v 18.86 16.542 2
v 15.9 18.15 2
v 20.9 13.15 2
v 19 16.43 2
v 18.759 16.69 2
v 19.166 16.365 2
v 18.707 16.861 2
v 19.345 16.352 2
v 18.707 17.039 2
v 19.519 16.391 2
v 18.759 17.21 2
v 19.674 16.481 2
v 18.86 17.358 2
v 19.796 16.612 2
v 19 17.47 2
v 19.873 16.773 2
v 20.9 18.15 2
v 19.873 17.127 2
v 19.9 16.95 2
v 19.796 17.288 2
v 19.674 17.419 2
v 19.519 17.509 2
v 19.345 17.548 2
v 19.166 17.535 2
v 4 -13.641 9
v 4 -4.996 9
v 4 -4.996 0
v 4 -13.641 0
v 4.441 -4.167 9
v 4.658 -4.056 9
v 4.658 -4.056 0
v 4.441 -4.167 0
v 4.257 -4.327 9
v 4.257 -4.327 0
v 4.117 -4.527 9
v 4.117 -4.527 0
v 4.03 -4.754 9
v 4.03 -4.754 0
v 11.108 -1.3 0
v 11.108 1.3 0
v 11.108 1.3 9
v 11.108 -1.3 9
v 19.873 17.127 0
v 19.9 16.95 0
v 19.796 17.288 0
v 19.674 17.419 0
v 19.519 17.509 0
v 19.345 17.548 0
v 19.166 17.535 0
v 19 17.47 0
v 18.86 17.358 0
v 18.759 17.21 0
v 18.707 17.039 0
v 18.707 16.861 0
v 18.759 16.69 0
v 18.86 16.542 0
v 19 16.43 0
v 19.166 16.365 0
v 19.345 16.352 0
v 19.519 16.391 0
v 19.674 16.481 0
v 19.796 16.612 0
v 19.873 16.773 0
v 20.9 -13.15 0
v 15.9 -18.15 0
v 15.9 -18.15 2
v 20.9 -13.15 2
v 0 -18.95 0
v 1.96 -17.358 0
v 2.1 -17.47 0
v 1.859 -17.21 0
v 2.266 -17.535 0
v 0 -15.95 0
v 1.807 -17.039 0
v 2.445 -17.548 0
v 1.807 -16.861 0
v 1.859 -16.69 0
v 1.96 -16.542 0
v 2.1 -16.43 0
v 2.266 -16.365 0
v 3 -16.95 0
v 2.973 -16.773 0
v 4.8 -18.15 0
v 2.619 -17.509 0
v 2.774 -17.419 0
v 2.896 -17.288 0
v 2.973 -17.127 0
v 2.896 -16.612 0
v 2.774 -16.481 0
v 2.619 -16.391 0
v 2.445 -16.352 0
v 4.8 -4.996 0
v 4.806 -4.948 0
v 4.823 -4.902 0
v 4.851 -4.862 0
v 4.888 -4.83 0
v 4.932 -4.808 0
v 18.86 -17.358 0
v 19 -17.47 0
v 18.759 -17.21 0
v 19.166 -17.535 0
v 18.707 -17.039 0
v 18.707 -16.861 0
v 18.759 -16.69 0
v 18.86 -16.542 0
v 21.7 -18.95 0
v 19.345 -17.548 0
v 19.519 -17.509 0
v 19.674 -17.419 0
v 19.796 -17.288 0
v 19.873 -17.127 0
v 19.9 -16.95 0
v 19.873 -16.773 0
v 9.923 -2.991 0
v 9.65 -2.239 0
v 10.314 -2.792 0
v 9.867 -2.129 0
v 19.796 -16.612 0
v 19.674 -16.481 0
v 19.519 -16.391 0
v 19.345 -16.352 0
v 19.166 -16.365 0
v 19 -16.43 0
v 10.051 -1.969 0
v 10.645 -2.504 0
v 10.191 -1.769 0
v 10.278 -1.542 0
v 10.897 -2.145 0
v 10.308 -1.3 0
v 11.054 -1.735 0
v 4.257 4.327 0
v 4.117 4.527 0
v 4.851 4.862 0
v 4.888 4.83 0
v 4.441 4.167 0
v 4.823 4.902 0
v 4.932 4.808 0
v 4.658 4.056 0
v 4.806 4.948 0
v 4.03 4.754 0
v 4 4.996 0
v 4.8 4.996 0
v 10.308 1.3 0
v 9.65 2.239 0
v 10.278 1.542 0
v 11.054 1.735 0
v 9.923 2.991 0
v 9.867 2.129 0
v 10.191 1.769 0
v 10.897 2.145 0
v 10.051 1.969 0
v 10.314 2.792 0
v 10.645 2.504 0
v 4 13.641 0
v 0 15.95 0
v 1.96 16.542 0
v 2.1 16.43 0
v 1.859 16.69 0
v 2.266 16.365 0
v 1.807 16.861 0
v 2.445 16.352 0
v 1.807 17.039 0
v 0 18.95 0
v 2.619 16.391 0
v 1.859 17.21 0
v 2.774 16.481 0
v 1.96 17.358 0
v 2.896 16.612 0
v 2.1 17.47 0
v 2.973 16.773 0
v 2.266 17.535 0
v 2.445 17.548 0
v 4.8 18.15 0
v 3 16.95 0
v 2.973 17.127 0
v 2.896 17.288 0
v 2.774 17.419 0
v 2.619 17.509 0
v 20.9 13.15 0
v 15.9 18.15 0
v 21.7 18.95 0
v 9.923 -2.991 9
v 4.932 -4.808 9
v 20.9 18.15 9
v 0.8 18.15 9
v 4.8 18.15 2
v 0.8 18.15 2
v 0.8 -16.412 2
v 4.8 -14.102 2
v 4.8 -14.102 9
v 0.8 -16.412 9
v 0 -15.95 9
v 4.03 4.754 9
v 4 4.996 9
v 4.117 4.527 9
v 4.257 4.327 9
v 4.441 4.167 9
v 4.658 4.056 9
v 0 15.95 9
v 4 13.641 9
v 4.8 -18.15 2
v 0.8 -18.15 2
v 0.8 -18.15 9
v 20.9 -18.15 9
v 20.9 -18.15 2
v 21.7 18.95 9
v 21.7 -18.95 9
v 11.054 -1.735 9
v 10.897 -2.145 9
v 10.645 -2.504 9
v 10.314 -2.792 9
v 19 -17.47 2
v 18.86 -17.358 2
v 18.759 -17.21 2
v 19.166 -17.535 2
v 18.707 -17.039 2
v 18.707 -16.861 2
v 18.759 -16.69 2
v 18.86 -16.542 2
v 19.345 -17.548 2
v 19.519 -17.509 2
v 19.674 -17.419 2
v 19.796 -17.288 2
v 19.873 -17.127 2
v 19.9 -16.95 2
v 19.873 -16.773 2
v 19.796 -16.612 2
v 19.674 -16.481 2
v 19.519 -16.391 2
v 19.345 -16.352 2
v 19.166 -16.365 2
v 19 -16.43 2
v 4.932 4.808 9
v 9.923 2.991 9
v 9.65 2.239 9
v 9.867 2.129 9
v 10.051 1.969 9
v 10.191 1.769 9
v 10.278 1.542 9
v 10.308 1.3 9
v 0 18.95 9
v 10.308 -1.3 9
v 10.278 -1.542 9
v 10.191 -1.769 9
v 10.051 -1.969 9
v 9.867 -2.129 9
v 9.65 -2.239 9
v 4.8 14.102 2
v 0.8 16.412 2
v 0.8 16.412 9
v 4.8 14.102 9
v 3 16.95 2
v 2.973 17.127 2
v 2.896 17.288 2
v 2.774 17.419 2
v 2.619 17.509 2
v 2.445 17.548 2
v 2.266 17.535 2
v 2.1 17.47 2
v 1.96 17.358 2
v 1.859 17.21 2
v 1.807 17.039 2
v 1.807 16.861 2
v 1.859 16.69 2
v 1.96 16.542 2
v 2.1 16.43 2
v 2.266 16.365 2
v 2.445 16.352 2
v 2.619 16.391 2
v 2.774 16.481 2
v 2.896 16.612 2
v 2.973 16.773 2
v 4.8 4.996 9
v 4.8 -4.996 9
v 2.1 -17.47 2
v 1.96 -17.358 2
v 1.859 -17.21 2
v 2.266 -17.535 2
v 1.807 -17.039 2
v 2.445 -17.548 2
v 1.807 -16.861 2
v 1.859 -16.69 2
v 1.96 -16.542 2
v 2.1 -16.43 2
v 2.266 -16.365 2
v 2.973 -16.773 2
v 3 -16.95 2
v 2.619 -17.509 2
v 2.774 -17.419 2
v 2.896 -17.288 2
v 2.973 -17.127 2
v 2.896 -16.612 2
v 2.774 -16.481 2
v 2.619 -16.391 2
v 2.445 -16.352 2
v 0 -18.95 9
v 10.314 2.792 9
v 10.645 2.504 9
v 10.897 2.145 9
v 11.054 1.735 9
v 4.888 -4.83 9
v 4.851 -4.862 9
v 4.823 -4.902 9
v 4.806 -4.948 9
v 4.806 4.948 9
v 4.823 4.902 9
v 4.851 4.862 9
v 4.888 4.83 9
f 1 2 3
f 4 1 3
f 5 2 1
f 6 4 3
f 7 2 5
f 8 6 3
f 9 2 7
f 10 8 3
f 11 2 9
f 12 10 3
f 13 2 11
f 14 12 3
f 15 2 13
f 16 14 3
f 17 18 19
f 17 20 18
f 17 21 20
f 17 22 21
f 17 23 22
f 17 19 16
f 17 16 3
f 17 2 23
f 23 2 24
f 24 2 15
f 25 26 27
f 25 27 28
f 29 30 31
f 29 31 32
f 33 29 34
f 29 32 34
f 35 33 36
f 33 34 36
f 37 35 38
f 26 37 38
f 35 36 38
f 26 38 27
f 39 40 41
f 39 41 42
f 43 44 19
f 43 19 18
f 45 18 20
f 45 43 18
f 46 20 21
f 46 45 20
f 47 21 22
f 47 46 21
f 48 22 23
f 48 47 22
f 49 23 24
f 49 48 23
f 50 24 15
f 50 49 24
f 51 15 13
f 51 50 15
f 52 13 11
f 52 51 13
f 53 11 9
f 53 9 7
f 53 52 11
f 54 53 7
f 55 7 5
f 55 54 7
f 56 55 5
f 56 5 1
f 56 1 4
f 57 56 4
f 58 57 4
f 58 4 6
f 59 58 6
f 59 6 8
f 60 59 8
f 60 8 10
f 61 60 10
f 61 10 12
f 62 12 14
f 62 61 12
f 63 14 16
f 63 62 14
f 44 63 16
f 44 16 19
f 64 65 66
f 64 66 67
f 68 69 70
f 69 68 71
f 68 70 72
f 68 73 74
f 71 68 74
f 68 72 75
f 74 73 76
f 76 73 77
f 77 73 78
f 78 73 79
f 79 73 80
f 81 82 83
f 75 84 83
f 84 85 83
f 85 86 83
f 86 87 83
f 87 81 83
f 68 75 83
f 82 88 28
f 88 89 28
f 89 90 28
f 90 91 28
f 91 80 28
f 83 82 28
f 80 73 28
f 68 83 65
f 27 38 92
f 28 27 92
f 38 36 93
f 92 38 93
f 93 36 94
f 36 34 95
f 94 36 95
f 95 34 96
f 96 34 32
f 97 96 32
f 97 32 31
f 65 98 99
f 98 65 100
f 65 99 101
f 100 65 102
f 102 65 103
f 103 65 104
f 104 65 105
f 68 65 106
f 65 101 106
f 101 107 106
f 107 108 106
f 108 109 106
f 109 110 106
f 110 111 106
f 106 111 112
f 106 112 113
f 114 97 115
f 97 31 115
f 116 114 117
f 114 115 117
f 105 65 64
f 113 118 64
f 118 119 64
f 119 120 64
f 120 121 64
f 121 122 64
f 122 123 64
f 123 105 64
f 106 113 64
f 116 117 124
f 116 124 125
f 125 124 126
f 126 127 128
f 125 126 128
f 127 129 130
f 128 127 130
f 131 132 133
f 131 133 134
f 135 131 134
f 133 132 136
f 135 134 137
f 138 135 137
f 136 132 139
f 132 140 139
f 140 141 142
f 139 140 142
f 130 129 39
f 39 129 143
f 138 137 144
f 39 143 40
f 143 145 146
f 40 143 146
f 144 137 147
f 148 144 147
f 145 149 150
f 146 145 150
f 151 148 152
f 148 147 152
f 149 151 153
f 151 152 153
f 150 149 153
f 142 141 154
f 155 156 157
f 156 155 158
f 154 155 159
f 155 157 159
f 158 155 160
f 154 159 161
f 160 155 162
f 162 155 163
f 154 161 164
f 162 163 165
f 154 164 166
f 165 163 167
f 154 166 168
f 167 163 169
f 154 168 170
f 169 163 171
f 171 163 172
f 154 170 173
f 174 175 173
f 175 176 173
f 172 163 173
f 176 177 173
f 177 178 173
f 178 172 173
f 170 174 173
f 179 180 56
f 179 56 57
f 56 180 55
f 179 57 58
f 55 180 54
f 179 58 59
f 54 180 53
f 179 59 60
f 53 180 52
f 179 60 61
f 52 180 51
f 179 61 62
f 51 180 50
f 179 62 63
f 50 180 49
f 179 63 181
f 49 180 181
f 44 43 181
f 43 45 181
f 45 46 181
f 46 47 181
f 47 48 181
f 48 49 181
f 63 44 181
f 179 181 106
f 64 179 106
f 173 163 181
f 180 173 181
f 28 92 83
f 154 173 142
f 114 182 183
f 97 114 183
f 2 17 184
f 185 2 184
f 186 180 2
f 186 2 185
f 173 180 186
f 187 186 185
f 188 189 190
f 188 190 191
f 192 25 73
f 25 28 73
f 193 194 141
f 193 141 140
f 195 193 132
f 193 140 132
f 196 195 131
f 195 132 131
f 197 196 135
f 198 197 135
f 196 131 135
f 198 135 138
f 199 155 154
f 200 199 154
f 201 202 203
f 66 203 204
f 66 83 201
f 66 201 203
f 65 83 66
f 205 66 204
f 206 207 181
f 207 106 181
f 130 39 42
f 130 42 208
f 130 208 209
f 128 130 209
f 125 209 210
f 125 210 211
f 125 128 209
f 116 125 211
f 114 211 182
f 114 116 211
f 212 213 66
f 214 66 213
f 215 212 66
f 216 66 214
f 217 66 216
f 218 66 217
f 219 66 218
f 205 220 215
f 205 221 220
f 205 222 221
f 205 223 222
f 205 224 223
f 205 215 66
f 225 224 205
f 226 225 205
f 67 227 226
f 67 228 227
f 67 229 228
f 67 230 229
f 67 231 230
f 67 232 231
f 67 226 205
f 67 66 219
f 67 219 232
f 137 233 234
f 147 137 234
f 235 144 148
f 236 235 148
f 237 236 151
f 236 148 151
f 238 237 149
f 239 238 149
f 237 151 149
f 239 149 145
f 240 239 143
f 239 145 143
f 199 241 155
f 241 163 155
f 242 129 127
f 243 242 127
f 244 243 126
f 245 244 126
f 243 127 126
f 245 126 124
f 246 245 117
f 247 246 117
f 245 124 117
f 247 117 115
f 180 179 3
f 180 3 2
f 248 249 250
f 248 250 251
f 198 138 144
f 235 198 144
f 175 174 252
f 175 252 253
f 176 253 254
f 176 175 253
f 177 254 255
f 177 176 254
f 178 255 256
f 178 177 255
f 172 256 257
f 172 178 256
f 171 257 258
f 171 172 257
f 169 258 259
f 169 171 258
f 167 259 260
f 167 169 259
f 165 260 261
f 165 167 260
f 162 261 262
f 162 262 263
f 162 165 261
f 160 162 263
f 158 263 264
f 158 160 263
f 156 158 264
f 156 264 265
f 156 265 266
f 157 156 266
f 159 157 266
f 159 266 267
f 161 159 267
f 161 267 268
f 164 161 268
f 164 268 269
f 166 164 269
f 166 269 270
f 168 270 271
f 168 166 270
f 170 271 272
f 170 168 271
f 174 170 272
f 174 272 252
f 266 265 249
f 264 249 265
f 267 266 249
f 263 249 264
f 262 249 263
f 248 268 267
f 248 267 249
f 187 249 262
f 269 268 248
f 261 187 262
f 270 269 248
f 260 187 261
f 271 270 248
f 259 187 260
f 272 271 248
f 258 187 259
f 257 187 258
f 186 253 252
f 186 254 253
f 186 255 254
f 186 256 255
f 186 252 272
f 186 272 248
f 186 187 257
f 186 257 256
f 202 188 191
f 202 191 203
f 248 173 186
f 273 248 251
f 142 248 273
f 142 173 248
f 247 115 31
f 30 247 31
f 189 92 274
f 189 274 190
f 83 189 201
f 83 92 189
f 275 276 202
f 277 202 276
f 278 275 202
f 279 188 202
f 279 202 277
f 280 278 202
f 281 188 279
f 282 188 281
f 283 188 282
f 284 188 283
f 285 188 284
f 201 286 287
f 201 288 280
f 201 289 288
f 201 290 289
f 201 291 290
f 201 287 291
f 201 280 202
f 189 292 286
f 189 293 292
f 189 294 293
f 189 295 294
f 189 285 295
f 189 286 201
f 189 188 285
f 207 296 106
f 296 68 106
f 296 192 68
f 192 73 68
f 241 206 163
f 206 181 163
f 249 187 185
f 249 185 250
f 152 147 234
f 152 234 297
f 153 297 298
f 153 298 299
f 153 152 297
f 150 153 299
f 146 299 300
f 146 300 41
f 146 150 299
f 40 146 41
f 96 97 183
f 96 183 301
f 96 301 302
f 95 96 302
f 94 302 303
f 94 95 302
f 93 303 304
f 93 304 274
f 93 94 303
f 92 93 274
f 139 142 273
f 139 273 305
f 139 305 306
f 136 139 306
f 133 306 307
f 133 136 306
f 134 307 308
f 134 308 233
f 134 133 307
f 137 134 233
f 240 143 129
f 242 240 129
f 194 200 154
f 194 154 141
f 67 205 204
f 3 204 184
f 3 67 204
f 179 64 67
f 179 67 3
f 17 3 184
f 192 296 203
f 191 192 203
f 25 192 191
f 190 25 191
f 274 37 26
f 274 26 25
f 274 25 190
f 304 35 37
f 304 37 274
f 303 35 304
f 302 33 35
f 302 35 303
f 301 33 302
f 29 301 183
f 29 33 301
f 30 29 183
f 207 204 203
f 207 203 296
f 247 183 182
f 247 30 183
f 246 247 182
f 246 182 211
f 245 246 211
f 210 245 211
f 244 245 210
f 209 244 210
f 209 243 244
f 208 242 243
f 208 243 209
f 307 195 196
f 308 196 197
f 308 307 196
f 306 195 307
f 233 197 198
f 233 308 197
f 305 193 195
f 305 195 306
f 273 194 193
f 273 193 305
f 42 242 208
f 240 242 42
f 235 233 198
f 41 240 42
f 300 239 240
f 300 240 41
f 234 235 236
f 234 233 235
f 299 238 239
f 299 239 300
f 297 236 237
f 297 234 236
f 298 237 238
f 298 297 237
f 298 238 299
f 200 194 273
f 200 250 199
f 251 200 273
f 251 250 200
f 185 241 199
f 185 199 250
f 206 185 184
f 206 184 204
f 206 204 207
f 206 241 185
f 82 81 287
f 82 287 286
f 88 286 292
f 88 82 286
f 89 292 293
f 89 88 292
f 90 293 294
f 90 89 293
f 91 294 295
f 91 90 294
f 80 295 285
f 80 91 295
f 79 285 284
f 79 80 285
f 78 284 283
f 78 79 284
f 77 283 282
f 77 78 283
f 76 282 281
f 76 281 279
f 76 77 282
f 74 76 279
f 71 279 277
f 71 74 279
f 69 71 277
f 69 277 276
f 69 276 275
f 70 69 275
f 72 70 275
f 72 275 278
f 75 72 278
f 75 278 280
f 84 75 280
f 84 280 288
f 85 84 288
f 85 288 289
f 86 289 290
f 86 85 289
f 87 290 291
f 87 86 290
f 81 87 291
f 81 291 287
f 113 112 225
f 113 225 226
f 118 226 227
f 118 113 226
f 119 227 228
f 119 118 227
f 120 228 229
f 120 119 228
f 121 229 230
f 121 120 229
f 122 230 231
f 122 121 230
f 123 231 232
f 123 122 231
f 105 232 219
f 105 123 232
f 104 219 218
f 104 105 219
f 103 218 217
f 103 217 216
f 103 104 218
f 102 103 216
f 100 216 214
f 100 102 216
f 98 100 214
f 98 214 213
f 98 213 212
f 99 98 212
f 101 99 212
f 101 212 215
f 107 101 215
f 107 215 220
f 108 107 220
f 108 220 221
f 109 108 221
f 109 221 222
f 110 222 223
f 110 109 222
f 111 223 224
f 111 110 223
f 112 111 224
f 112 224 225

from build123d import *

# Parameters (mm, degrees)
SKETCH_1_R      = 0.6
EXTRUDE_1_DEPTH = 2
EXTRUDE_2_DEPTH = 7


with BuildPart() as part:
    # Эскиз1 → Бобышка-Вытянуть1 (new body)
    with BuildSketch(Plane.XY):
        with BuildLine():
            Line((9.649784207, -2.239485083), (4.657979857, -4.056353282))
            ThreePointArc((4.657979857, -4.056353282), (4.180847956, -4.422469466), (4, -4.996045902))
            Line((4, -4.996045902), (4, -13.640598923))
            Line((4, -13.640598923), (0, -15.95))
            Line((0, -15.95), (0, -18.95))
            Line((0, -18.95), (21.7, -18.95))
            Line((21.7, -18.95), (21.7, 18.95))
            Line((21.7, 18.95), (0, 18.95))
            Line((0, 18.95), (0, 15.95))
            Line((0, 15.95), (4, 13.640598923))
            Line((4, 13.640598923), (4, 4.996045902))
            ThreePointArc((4, 4.996045902), (4.180847956, 4.422469466), (4.657979857, 4.056353282))
            Line((4.657979857, 4.056353282), (9.649784207, 2.239485083))
            ThreePointArc((9.649784207, 2.239485083), (10.126916108, 1.873368898), (10.307764064, 1.299792462))
            Line((10.307764064, 1.299792462), (10.307764064, -1.299792462))
            ThreePointArc((10.307764064, -1.299792462), (10.126916108, -1.873368898), (9.649784207, -2.239485083))
        make_face()
        with Locations((2.4, -16.95)):
            Circle(SKETCH_1_R, mode=Mode.SUBTRACT)
        with Locations((2.4, 16.95)):
            Circle(SKETCH_1_R, mode=Mode.SUBTRACT)
        with Locations((19.3, -16.95)):
            Circle(SKETCH_1_R, mode=Mode.SUBTRACT)
        with Locations((19.3, 16.95)):
            Circle(SKETCH_1_R, mode=Mode.SUBTRACT)
        with BuildLine():
            Line((4.8, -18.15), (15.9, -18.15))
            Line((15.9, -18.15), (20.9, -13.15))
            Line((20.9, -13.15), (20.9, 13.15))
            Line((20.9, 13.15), (15.9, 18.15))
            Line((15.9, 18.15), (4.8, 18.15))
            Line((4.8, 18.15), (4.8, 14.102479139))
            Line((4.8, 14.102479139), (4.8, 4.996045902))
            ThreePointArc((4.8, 4.996045902), (4.836169591, 4.881330615), (4.931595971, 4.808107378))
            Line((4.931595971, 4.808107378), (9.923400322, 2.991239179))
            ThreePointArc((9.923400322, 2.991239179), (10.782237744, 2.332230047), (11.107764064, 1.299792462))
            Line((11.107764064, 1.299792462), (11.107764064, -1.299792462))
            ThreePointArc((11.107764064, -1.299792462), (10.782237744, -2.332230047), (9.923400322, -2.991239179))
            Line((9.923400322, -2.991239179), (4.931595971, -4.808107378))
            ThreePointArc((4.931595971, -4.808107378), (4.836169591, -4.881330615), (4.8, -4.996045902))
            Line((4.8, -4.996045902), (4.8, -14.102479139))
            Line((4.8, -14.102479139), (4.8, -18.15))
        make_face(mode=Mode.SUBTRACT)
    extrude(amount=EXTRUDE_1_DEPTH)

    # Эскиз3 → Бобышка-Вытянуть2 (add)
    with BuildSketch(Plane.XY.offset(2)):
        with BuildLine():
            Line((9.649784207, -2.239485083), (4.657979857, -4.056353282))
            ThreePointArc((4.657979857, -4.056353282), (4.180847956, -4.422469466), (4, -4.996045902))
            Line((4, -4.996045902), (4, -13.640598923))
            Line((4, -13.640598923), (0, -15.95))
            Line((0, -15.95), (0, -18.95))
            Line((0, -18.95), (21.7, -18.95))
            Line((21.7, -18.95), (21.7, 18.95))
            Line((21.7, 18.95), (0, 18.95))
            Line((0, 18.95), (0, 15.95))
            Line((0, 15.95), (4, 13.640598923))
            Line((4, 13.640598923), (4, 4.996045902))
            ThreePointArc((4, 4.996045902), (4.180847956, 4.422469466), (4.657979857, 4.056353282))
            Line((4.657979857, 4.056353282), (9.649784207, 2.239485083))
            ThreePointArc((9.649784207, 2.239485083), (10.126916108, 1.873368898), (10.307764064, 1.299792462))
            Line((10.307764064, 1.299792462), (10.307764064, -1.299792462))
            ThreePointArc((10.307764064, -1.299792462), (10.126916108, -1.873368898), (9.649784207, -2.239485083))
        make_face()
        with BuildLine():
            Line((0.8, -18.15), (20.9, -18.15))
            Line((20.9, -18.15), (20.9, 18.15))
            Line((20.9, 18.15), (0.8, 18.15))
            Line((0.8, 18.15), (0.8, 16.411880215))
            Line((0.8, 16.411880215), (4.8, 14.102479139))
            Line((4.8, 14.102479139), (4.8, 4.996045902))
            ThreePointArc((4.8, 4.996045902), (4.836169591, 4.881330615), (4.931595971, 4.808107378))
            Line((4.931595971, 4.808107378), (9.923400322, 2.991239179))
            ThreePointArc((9.923400322, 2.991239179), (10.782237744, 2.332230047), (11.107764064, 1.299792462))
            Line((11.107764064, 1.299792462), (11.107764064, -1.299792462))
            ThreePointArc((11.107764064, -1.299792462), (10.782237744, -2.332230047), (9.923400322, -2.991239179))
            Line((9.923400322, -2.991239179), (4.931595971, -4.808107378))
            ThreePointArc((4.931595971, -4.808107378), (4.836169591, -4.881330615), (4.8, -4.996045902))
            Line((4.8, -4.996045902), (4.8, -14.102479139))
            Line((4.8, -14.102479139), (0.8, -16.411880215))
            Line((0.8, -16.411880215), (0.8, -18.15))
        make_face(mode=Mode.SUBTRACT)
    extrude(amount=EXTRUDE_2_DEPTH)


solid = part.part
